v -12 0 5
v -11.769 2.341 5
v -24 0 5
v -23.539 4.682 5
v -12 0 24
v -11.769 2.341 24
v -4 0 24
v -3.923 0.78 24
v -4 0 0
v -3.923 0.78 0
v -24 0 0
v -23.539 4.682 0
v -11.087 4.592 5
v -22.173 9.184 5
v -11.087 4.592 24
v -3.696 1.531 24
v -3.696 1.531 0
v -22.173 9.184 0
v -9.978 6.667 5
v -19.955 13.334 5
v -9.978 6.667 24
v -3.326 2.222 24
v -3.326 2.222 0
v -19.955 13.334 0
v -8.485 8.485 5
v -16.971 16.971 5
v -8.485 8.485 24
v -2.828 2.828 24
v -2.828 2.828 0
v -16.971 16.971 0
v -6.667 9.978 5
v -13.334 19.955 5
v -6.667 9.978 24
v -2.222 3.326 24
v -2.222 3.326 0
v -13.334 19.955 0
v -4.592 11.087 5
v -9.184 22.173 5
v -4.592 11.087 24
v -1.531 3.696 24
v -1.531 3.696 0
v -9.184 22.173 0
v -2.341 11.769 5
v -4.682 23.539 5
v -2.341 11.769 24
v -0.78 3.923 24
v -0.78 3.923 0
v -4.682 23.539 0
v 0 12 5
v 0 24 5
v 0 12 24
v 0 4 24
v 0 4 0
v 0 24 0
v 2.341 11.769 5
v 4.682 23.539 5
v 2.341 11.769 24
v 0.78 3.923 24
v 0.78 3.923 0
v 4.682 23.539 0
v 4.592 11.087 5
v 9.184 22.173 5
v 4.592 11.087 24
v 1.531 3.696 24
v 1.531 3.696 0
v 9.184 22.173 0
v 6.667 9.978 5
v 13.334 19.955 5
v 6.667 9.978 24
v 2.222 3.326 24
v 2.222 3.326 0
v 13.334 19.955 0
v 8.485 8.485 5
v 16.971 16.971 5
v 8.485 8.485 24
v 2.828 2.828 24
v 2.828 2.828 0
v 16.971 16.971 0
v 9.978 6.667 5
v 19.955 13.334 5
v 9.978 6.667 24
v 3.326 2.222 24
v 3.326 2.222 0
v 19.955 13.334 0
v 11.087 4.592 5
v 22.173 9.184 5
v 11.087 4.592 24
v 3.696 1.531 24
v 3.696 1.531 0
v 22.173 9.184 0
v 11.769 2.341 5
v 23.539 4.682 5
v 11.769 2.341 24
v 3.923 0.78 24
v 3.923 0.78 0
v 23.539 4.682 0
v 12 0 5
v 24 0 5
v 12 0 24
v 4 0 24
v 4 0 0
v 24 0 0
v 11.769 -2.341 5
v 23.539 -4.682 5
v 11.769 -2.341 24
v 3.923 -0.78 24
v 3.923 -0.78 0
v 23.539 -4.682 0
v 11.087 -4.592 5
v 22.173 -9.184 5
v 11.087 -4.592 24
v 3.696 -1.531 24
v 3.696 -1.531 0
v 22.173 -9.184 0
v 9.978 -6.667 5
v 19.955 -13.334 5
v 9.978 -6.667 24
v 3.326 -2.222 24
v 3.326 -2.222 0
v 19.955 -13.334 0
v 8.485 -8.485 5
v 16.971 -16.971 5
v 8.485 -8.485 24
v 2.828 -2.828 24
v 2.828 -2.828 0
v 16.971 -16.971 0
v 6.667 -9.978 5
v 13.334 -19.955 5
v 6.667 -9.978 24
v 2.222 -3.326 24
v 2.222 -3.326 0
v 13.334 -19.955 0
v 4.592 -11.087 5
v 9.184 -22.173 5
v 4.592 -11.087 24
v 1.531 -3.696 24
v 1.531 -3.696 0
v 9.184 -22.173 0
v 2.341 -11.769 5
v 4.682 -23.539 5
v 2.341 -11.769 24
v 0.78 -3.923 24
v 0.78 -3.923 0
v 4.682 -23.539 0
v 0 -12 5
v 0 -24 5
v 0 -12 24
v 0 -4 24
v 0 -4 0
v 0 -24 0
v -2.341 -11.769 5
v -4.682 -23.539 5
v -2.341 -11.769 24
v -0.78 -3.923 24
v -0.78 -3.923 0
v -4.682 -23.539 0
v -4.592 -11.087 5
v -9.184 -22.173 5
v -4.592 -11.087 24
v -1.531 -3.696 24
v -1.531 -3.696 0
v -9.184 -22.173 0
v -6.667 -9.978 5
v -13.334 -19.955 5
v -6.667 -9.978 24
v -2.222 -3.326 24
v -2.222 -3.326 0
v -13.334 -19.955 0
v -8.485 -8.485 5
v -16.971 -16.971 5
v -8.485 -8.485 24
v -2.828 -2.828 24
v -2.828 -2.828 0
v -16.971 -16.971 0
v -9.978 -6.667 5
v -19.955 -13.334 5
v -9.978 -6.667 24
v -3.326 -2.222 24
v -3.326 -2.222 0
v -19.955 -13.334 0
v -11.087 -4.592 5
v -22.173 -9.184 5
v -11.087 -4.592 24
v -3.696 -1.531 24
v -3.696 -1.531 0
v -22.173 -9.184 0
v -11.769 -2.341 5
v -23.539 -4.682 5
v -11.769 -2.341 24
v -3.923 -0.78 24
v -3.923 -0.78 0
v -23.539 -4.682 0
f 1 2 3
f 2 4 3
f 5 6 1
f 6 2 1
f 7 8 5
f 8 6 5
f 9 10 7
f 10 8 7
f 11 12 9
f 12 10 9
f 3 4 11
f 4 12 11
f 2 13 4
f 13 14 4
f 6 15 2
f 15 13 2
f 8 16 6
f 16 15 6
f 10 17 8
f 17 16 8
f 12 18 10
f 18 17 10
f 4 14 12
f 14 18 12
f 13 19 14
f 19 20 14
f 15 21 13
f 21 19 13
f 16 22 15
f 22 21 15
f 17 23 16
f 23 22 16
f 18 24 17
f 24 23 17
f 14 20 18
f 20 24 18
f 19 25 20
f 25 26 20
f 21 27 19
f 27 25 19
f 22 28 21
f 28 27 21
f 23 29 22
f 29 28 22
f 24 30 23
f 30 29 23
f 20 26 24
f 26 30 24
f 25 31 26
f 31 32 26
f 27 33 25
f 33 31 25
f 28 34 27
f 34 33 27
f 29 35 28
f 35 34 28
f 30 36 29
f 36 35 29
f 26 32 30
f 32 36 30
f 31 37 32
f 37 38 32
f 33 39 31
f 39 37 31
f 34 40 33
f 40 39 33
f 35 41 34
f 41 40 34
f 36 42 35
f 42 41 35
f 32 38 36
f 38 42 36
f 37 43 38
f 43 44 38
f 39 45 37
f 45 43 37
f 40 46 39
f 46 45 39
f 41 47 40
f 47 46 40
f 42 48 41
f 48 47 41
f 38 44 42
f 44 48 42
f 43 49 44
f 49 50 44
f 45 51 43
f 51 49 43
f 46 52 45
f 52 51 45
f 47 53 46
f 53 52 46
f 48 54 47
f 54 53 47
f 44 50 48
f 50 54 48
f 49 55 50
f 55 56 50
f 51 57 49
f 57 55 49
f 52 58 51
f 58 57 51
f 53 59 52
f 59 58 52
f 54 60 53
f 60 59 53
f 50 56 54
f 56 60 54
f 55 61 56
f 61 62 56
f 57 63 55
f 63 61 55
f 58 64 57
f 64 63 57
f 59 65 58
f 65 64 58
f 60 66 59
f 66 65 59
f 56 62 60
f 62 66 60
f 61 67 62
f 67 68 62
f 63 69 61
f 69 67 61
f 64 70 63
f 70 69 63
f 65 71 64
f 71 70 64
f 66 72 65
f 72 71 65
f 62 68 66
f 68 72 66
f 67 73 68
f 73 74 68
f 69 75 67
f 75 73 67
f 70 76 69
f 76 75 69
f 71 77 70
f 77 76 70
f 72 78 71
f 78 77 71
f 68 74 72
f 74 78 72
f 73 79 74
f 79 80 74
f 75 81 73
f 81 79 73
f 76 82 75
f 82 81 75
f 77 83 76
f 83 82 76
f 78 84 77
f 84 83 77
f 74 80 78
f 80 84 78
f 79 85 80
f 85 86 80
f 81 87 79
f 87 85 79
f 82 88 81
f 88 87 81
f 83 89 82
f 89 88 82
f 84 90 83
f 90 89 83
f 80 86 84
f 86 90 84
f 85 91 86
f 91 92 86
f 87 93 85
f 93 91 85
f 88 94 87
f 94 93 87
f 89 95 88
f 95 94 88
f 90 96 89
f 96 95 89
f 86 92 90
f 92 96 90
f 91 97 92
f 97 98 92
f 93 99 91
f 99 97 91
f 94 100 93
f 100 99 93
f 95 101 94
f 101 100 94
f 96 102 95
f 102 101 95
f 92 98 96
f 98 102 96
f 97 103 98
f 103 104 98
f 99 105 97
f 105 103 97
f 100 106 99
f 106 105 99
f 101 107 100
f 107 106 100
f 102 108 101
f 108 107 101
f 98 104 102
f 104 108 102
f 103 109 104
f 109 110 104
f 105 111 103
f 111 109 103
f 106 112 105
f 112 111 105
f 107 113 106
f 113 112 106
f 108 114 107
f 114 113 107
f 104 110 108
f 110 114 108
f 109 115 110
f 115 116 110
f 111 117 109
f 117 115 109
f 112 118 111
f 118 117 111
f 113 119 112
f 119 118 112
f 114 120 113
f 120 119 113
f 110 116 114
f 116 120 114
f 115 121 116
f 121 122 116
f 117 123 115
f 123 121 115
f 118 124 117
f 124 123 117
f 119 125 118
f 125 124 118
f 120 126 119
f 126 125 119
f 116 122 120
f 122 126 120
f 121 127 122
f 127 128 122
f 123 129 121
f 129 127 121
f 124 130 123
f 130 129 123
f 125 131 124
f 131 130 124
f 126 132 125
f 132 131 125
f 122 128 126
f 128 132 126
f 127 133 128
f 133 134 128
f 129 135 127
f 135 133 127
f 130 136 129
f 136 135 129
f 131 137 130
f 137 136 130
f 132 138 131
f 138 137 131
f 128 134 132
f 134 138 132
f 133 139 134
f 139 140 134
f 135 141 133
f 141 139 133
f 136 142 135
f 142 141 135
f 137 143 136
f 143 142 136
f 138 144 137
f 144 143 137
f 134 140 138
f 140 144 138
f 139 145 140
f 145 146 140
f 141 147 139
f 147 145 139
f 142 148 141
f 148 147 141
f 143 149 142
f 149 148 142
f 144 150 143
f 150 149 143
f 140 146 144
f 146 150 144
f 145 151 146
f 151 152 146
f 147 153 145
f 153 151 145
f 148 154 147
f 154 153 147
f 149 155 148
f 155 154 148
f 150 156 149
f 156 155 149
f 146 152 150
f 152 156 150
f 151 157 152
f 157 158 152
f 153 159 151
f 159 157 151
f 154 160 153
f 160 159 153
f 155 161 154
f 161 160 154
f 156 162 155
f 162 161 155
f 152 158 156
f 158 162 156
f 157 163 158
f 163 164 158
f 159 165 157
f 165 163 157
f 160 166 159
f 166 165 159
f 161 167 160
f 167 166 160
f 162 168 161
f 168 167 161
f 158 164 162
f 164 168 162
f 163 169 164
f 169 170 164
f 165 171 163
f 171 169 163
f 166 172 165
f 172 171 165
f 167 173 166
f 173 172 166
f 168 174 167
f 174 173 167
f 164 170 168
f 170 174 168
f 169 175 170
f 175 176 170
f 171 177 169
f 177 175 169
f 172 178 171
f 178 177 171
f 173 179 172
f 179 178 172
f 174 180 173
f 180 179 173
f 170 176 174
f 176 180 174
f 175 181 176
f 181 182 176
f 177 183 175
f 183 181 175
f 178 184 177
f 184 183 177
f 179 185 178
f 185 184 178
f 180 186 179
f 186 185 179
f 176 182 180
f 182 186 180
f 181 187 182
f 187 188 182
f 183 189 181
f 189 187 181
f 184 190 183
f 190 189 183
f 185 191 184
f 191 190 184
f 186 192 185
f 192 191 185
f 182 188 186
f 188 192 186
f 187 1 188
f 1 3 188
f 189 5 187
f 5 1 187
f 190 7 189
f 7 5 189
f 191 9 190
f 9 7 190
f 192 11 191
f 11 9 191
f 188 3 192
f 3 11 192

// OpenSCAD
$fn = 32;

// ----------------------------------------------------------------------
// Revolved part: flanged bushing R24
// ----------------------------------------------------------------------

// --- parameters (mm) ---
bore_r = 4;               // bore radius
flange_r = 24;            // flange radius
flange_h = 5;             // flange thickness
sleeve_r = 12;            // sleeve radius
total_h = 24;             // overall height
revolve_angle = 360;      // revolve sweep, degrees

bore_d = 2 * bore_r;
flange_d = 2 * flange_r;
sleeve_d = 2 * sleeve_r;

profile = [[4, 0], [24, 0], [24, 5], [12, 5], [12, 24], [4, 24]];  // primary outline, 6 points, counter clockwise

// --- the one profile operation ---
rotate_extrude(angle = revolve_angle) polygon(points = profile);
